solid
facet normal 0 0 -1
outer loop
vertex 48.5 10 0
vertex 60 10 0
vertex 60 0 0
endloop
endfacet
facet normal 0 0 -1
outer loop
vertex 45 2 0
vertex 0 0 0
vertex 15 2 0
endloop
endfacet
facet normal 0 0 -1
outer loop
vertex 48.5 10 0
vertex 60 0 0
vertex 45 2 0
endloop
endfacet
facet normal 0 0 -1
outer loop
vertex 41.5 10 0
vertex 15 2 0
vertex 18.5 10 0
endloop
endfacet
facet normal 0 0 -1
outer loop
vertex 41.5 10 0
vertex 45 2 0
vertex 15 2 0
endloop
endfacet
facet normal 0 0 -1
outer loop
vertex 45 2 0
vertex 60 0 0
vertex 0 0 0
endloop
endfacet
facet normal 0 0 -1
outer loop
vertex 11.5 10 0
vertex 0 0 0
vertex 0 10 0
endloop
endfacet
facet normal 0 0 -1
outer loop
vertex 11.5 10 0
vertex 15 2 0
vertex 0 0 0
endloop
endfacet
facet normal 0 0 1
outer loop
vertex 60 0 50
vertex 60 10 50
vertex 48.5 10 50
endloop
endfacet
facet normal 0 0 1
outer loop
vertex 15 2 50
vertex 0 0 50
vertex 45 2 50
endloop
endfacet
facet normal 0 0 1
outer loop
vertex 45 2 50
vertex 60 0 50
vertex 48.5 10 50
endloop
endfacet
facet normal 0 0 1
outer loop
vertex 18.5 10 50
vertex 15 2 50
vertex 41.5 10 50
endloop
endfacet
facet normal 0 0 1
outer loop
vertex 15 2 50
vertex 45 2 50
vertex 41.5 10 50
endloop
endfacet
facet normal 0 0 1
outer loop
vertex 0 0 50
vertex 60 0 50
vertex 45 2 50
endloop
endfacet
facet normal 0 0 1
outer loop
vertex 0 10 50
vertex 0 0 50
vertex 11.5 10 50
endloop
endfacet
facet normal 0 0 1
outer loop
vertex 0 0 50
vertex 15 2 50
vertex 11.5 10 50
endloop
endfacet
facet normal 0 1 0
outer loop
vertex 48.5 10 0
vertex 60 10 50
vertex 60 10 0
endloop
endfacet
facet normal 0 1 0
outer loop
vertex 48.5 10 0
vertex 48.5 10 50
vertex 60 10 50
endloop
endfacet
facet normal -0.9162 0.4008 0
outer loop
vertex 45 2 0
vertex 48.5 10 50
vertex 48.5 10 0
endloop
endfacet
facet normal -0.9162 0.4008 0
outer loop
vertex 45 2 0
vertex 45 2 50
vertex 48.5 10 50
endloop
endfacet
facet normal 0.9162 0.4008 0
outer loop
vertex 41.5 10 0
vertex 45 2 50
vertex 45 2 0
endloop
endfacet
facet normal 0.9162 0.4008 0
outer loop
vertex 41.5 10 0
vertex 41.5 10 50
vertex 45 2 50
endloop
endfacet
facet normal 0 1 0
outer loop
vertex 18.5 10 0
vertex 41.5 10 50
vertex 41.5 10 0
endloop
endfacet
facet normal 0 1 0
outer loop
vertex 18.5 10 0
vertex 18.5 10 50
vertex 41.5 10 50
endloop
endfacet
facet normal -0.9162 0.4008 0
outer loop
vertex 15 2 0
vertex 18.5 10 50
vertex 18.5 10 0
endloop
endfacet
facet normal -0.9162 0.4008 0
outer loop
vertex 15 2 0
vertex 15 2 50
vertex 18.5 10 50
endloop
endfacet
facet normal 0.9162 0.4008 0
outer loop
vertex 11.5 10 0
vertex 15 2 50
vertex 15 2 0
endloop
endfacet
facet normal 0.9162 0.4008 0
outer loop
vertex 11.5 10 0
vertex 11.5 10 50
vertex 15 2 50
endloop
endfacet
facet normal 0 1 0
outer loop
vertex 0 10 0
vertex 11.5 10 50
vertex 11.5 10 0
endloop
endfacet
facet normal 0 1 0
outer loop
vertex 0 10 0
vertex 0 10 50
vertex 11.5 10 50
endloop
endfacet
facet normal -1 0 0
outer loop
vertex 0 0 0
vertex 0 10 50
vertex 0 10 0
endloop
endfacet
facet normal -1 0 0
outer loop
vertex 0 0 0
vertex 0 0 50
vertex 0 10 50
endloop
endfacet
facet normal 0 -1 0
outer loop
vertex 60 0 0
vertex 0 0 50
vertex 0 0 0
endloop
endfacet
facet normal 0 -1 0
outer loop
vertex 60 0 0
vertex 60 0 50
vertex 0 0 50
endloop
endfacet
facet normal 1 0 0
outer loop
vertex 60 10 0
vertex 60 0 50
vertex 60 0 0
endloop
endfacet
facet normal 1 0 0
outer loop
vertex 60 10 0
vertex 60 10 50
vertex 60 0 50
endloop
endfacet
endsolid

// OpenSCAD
$fn = 32;

// ----------------------------------------------------------------------
// V guide rail: doublev, 60 mm wide
// ----------------------------------------------------------------------

// --- parameters (mm) ---
rail_w = 60;              // rail width, X
base_t = 10;              // base plate thickness
v_depth = 8;              // V feature depth / height
v_half_w = 7;             // half width of the V at the base face
plate_t = 50;             // rail length, Z (the extrusion height)
groove_off = 15;          // offset of each groove from the centreline

centre_x = rail_w / 2;  // rail centreline
groove_a = centre_x - groove_off;  // axis of the first groove
groove_b = centre_x + groove_off;  // axis of the second groove

profile = [[0, 0], [60, 0], [60, 10], [48.5, 10], [45, 2], [41.5, 10], [18.5, 10], [15, 2], [11.5, 10], [0, 10]];  // primary outline, 10 points, counter clockwise

// --- the one profile operation ---
linear_extrude(height = plate_t) polygon(points = profile);
